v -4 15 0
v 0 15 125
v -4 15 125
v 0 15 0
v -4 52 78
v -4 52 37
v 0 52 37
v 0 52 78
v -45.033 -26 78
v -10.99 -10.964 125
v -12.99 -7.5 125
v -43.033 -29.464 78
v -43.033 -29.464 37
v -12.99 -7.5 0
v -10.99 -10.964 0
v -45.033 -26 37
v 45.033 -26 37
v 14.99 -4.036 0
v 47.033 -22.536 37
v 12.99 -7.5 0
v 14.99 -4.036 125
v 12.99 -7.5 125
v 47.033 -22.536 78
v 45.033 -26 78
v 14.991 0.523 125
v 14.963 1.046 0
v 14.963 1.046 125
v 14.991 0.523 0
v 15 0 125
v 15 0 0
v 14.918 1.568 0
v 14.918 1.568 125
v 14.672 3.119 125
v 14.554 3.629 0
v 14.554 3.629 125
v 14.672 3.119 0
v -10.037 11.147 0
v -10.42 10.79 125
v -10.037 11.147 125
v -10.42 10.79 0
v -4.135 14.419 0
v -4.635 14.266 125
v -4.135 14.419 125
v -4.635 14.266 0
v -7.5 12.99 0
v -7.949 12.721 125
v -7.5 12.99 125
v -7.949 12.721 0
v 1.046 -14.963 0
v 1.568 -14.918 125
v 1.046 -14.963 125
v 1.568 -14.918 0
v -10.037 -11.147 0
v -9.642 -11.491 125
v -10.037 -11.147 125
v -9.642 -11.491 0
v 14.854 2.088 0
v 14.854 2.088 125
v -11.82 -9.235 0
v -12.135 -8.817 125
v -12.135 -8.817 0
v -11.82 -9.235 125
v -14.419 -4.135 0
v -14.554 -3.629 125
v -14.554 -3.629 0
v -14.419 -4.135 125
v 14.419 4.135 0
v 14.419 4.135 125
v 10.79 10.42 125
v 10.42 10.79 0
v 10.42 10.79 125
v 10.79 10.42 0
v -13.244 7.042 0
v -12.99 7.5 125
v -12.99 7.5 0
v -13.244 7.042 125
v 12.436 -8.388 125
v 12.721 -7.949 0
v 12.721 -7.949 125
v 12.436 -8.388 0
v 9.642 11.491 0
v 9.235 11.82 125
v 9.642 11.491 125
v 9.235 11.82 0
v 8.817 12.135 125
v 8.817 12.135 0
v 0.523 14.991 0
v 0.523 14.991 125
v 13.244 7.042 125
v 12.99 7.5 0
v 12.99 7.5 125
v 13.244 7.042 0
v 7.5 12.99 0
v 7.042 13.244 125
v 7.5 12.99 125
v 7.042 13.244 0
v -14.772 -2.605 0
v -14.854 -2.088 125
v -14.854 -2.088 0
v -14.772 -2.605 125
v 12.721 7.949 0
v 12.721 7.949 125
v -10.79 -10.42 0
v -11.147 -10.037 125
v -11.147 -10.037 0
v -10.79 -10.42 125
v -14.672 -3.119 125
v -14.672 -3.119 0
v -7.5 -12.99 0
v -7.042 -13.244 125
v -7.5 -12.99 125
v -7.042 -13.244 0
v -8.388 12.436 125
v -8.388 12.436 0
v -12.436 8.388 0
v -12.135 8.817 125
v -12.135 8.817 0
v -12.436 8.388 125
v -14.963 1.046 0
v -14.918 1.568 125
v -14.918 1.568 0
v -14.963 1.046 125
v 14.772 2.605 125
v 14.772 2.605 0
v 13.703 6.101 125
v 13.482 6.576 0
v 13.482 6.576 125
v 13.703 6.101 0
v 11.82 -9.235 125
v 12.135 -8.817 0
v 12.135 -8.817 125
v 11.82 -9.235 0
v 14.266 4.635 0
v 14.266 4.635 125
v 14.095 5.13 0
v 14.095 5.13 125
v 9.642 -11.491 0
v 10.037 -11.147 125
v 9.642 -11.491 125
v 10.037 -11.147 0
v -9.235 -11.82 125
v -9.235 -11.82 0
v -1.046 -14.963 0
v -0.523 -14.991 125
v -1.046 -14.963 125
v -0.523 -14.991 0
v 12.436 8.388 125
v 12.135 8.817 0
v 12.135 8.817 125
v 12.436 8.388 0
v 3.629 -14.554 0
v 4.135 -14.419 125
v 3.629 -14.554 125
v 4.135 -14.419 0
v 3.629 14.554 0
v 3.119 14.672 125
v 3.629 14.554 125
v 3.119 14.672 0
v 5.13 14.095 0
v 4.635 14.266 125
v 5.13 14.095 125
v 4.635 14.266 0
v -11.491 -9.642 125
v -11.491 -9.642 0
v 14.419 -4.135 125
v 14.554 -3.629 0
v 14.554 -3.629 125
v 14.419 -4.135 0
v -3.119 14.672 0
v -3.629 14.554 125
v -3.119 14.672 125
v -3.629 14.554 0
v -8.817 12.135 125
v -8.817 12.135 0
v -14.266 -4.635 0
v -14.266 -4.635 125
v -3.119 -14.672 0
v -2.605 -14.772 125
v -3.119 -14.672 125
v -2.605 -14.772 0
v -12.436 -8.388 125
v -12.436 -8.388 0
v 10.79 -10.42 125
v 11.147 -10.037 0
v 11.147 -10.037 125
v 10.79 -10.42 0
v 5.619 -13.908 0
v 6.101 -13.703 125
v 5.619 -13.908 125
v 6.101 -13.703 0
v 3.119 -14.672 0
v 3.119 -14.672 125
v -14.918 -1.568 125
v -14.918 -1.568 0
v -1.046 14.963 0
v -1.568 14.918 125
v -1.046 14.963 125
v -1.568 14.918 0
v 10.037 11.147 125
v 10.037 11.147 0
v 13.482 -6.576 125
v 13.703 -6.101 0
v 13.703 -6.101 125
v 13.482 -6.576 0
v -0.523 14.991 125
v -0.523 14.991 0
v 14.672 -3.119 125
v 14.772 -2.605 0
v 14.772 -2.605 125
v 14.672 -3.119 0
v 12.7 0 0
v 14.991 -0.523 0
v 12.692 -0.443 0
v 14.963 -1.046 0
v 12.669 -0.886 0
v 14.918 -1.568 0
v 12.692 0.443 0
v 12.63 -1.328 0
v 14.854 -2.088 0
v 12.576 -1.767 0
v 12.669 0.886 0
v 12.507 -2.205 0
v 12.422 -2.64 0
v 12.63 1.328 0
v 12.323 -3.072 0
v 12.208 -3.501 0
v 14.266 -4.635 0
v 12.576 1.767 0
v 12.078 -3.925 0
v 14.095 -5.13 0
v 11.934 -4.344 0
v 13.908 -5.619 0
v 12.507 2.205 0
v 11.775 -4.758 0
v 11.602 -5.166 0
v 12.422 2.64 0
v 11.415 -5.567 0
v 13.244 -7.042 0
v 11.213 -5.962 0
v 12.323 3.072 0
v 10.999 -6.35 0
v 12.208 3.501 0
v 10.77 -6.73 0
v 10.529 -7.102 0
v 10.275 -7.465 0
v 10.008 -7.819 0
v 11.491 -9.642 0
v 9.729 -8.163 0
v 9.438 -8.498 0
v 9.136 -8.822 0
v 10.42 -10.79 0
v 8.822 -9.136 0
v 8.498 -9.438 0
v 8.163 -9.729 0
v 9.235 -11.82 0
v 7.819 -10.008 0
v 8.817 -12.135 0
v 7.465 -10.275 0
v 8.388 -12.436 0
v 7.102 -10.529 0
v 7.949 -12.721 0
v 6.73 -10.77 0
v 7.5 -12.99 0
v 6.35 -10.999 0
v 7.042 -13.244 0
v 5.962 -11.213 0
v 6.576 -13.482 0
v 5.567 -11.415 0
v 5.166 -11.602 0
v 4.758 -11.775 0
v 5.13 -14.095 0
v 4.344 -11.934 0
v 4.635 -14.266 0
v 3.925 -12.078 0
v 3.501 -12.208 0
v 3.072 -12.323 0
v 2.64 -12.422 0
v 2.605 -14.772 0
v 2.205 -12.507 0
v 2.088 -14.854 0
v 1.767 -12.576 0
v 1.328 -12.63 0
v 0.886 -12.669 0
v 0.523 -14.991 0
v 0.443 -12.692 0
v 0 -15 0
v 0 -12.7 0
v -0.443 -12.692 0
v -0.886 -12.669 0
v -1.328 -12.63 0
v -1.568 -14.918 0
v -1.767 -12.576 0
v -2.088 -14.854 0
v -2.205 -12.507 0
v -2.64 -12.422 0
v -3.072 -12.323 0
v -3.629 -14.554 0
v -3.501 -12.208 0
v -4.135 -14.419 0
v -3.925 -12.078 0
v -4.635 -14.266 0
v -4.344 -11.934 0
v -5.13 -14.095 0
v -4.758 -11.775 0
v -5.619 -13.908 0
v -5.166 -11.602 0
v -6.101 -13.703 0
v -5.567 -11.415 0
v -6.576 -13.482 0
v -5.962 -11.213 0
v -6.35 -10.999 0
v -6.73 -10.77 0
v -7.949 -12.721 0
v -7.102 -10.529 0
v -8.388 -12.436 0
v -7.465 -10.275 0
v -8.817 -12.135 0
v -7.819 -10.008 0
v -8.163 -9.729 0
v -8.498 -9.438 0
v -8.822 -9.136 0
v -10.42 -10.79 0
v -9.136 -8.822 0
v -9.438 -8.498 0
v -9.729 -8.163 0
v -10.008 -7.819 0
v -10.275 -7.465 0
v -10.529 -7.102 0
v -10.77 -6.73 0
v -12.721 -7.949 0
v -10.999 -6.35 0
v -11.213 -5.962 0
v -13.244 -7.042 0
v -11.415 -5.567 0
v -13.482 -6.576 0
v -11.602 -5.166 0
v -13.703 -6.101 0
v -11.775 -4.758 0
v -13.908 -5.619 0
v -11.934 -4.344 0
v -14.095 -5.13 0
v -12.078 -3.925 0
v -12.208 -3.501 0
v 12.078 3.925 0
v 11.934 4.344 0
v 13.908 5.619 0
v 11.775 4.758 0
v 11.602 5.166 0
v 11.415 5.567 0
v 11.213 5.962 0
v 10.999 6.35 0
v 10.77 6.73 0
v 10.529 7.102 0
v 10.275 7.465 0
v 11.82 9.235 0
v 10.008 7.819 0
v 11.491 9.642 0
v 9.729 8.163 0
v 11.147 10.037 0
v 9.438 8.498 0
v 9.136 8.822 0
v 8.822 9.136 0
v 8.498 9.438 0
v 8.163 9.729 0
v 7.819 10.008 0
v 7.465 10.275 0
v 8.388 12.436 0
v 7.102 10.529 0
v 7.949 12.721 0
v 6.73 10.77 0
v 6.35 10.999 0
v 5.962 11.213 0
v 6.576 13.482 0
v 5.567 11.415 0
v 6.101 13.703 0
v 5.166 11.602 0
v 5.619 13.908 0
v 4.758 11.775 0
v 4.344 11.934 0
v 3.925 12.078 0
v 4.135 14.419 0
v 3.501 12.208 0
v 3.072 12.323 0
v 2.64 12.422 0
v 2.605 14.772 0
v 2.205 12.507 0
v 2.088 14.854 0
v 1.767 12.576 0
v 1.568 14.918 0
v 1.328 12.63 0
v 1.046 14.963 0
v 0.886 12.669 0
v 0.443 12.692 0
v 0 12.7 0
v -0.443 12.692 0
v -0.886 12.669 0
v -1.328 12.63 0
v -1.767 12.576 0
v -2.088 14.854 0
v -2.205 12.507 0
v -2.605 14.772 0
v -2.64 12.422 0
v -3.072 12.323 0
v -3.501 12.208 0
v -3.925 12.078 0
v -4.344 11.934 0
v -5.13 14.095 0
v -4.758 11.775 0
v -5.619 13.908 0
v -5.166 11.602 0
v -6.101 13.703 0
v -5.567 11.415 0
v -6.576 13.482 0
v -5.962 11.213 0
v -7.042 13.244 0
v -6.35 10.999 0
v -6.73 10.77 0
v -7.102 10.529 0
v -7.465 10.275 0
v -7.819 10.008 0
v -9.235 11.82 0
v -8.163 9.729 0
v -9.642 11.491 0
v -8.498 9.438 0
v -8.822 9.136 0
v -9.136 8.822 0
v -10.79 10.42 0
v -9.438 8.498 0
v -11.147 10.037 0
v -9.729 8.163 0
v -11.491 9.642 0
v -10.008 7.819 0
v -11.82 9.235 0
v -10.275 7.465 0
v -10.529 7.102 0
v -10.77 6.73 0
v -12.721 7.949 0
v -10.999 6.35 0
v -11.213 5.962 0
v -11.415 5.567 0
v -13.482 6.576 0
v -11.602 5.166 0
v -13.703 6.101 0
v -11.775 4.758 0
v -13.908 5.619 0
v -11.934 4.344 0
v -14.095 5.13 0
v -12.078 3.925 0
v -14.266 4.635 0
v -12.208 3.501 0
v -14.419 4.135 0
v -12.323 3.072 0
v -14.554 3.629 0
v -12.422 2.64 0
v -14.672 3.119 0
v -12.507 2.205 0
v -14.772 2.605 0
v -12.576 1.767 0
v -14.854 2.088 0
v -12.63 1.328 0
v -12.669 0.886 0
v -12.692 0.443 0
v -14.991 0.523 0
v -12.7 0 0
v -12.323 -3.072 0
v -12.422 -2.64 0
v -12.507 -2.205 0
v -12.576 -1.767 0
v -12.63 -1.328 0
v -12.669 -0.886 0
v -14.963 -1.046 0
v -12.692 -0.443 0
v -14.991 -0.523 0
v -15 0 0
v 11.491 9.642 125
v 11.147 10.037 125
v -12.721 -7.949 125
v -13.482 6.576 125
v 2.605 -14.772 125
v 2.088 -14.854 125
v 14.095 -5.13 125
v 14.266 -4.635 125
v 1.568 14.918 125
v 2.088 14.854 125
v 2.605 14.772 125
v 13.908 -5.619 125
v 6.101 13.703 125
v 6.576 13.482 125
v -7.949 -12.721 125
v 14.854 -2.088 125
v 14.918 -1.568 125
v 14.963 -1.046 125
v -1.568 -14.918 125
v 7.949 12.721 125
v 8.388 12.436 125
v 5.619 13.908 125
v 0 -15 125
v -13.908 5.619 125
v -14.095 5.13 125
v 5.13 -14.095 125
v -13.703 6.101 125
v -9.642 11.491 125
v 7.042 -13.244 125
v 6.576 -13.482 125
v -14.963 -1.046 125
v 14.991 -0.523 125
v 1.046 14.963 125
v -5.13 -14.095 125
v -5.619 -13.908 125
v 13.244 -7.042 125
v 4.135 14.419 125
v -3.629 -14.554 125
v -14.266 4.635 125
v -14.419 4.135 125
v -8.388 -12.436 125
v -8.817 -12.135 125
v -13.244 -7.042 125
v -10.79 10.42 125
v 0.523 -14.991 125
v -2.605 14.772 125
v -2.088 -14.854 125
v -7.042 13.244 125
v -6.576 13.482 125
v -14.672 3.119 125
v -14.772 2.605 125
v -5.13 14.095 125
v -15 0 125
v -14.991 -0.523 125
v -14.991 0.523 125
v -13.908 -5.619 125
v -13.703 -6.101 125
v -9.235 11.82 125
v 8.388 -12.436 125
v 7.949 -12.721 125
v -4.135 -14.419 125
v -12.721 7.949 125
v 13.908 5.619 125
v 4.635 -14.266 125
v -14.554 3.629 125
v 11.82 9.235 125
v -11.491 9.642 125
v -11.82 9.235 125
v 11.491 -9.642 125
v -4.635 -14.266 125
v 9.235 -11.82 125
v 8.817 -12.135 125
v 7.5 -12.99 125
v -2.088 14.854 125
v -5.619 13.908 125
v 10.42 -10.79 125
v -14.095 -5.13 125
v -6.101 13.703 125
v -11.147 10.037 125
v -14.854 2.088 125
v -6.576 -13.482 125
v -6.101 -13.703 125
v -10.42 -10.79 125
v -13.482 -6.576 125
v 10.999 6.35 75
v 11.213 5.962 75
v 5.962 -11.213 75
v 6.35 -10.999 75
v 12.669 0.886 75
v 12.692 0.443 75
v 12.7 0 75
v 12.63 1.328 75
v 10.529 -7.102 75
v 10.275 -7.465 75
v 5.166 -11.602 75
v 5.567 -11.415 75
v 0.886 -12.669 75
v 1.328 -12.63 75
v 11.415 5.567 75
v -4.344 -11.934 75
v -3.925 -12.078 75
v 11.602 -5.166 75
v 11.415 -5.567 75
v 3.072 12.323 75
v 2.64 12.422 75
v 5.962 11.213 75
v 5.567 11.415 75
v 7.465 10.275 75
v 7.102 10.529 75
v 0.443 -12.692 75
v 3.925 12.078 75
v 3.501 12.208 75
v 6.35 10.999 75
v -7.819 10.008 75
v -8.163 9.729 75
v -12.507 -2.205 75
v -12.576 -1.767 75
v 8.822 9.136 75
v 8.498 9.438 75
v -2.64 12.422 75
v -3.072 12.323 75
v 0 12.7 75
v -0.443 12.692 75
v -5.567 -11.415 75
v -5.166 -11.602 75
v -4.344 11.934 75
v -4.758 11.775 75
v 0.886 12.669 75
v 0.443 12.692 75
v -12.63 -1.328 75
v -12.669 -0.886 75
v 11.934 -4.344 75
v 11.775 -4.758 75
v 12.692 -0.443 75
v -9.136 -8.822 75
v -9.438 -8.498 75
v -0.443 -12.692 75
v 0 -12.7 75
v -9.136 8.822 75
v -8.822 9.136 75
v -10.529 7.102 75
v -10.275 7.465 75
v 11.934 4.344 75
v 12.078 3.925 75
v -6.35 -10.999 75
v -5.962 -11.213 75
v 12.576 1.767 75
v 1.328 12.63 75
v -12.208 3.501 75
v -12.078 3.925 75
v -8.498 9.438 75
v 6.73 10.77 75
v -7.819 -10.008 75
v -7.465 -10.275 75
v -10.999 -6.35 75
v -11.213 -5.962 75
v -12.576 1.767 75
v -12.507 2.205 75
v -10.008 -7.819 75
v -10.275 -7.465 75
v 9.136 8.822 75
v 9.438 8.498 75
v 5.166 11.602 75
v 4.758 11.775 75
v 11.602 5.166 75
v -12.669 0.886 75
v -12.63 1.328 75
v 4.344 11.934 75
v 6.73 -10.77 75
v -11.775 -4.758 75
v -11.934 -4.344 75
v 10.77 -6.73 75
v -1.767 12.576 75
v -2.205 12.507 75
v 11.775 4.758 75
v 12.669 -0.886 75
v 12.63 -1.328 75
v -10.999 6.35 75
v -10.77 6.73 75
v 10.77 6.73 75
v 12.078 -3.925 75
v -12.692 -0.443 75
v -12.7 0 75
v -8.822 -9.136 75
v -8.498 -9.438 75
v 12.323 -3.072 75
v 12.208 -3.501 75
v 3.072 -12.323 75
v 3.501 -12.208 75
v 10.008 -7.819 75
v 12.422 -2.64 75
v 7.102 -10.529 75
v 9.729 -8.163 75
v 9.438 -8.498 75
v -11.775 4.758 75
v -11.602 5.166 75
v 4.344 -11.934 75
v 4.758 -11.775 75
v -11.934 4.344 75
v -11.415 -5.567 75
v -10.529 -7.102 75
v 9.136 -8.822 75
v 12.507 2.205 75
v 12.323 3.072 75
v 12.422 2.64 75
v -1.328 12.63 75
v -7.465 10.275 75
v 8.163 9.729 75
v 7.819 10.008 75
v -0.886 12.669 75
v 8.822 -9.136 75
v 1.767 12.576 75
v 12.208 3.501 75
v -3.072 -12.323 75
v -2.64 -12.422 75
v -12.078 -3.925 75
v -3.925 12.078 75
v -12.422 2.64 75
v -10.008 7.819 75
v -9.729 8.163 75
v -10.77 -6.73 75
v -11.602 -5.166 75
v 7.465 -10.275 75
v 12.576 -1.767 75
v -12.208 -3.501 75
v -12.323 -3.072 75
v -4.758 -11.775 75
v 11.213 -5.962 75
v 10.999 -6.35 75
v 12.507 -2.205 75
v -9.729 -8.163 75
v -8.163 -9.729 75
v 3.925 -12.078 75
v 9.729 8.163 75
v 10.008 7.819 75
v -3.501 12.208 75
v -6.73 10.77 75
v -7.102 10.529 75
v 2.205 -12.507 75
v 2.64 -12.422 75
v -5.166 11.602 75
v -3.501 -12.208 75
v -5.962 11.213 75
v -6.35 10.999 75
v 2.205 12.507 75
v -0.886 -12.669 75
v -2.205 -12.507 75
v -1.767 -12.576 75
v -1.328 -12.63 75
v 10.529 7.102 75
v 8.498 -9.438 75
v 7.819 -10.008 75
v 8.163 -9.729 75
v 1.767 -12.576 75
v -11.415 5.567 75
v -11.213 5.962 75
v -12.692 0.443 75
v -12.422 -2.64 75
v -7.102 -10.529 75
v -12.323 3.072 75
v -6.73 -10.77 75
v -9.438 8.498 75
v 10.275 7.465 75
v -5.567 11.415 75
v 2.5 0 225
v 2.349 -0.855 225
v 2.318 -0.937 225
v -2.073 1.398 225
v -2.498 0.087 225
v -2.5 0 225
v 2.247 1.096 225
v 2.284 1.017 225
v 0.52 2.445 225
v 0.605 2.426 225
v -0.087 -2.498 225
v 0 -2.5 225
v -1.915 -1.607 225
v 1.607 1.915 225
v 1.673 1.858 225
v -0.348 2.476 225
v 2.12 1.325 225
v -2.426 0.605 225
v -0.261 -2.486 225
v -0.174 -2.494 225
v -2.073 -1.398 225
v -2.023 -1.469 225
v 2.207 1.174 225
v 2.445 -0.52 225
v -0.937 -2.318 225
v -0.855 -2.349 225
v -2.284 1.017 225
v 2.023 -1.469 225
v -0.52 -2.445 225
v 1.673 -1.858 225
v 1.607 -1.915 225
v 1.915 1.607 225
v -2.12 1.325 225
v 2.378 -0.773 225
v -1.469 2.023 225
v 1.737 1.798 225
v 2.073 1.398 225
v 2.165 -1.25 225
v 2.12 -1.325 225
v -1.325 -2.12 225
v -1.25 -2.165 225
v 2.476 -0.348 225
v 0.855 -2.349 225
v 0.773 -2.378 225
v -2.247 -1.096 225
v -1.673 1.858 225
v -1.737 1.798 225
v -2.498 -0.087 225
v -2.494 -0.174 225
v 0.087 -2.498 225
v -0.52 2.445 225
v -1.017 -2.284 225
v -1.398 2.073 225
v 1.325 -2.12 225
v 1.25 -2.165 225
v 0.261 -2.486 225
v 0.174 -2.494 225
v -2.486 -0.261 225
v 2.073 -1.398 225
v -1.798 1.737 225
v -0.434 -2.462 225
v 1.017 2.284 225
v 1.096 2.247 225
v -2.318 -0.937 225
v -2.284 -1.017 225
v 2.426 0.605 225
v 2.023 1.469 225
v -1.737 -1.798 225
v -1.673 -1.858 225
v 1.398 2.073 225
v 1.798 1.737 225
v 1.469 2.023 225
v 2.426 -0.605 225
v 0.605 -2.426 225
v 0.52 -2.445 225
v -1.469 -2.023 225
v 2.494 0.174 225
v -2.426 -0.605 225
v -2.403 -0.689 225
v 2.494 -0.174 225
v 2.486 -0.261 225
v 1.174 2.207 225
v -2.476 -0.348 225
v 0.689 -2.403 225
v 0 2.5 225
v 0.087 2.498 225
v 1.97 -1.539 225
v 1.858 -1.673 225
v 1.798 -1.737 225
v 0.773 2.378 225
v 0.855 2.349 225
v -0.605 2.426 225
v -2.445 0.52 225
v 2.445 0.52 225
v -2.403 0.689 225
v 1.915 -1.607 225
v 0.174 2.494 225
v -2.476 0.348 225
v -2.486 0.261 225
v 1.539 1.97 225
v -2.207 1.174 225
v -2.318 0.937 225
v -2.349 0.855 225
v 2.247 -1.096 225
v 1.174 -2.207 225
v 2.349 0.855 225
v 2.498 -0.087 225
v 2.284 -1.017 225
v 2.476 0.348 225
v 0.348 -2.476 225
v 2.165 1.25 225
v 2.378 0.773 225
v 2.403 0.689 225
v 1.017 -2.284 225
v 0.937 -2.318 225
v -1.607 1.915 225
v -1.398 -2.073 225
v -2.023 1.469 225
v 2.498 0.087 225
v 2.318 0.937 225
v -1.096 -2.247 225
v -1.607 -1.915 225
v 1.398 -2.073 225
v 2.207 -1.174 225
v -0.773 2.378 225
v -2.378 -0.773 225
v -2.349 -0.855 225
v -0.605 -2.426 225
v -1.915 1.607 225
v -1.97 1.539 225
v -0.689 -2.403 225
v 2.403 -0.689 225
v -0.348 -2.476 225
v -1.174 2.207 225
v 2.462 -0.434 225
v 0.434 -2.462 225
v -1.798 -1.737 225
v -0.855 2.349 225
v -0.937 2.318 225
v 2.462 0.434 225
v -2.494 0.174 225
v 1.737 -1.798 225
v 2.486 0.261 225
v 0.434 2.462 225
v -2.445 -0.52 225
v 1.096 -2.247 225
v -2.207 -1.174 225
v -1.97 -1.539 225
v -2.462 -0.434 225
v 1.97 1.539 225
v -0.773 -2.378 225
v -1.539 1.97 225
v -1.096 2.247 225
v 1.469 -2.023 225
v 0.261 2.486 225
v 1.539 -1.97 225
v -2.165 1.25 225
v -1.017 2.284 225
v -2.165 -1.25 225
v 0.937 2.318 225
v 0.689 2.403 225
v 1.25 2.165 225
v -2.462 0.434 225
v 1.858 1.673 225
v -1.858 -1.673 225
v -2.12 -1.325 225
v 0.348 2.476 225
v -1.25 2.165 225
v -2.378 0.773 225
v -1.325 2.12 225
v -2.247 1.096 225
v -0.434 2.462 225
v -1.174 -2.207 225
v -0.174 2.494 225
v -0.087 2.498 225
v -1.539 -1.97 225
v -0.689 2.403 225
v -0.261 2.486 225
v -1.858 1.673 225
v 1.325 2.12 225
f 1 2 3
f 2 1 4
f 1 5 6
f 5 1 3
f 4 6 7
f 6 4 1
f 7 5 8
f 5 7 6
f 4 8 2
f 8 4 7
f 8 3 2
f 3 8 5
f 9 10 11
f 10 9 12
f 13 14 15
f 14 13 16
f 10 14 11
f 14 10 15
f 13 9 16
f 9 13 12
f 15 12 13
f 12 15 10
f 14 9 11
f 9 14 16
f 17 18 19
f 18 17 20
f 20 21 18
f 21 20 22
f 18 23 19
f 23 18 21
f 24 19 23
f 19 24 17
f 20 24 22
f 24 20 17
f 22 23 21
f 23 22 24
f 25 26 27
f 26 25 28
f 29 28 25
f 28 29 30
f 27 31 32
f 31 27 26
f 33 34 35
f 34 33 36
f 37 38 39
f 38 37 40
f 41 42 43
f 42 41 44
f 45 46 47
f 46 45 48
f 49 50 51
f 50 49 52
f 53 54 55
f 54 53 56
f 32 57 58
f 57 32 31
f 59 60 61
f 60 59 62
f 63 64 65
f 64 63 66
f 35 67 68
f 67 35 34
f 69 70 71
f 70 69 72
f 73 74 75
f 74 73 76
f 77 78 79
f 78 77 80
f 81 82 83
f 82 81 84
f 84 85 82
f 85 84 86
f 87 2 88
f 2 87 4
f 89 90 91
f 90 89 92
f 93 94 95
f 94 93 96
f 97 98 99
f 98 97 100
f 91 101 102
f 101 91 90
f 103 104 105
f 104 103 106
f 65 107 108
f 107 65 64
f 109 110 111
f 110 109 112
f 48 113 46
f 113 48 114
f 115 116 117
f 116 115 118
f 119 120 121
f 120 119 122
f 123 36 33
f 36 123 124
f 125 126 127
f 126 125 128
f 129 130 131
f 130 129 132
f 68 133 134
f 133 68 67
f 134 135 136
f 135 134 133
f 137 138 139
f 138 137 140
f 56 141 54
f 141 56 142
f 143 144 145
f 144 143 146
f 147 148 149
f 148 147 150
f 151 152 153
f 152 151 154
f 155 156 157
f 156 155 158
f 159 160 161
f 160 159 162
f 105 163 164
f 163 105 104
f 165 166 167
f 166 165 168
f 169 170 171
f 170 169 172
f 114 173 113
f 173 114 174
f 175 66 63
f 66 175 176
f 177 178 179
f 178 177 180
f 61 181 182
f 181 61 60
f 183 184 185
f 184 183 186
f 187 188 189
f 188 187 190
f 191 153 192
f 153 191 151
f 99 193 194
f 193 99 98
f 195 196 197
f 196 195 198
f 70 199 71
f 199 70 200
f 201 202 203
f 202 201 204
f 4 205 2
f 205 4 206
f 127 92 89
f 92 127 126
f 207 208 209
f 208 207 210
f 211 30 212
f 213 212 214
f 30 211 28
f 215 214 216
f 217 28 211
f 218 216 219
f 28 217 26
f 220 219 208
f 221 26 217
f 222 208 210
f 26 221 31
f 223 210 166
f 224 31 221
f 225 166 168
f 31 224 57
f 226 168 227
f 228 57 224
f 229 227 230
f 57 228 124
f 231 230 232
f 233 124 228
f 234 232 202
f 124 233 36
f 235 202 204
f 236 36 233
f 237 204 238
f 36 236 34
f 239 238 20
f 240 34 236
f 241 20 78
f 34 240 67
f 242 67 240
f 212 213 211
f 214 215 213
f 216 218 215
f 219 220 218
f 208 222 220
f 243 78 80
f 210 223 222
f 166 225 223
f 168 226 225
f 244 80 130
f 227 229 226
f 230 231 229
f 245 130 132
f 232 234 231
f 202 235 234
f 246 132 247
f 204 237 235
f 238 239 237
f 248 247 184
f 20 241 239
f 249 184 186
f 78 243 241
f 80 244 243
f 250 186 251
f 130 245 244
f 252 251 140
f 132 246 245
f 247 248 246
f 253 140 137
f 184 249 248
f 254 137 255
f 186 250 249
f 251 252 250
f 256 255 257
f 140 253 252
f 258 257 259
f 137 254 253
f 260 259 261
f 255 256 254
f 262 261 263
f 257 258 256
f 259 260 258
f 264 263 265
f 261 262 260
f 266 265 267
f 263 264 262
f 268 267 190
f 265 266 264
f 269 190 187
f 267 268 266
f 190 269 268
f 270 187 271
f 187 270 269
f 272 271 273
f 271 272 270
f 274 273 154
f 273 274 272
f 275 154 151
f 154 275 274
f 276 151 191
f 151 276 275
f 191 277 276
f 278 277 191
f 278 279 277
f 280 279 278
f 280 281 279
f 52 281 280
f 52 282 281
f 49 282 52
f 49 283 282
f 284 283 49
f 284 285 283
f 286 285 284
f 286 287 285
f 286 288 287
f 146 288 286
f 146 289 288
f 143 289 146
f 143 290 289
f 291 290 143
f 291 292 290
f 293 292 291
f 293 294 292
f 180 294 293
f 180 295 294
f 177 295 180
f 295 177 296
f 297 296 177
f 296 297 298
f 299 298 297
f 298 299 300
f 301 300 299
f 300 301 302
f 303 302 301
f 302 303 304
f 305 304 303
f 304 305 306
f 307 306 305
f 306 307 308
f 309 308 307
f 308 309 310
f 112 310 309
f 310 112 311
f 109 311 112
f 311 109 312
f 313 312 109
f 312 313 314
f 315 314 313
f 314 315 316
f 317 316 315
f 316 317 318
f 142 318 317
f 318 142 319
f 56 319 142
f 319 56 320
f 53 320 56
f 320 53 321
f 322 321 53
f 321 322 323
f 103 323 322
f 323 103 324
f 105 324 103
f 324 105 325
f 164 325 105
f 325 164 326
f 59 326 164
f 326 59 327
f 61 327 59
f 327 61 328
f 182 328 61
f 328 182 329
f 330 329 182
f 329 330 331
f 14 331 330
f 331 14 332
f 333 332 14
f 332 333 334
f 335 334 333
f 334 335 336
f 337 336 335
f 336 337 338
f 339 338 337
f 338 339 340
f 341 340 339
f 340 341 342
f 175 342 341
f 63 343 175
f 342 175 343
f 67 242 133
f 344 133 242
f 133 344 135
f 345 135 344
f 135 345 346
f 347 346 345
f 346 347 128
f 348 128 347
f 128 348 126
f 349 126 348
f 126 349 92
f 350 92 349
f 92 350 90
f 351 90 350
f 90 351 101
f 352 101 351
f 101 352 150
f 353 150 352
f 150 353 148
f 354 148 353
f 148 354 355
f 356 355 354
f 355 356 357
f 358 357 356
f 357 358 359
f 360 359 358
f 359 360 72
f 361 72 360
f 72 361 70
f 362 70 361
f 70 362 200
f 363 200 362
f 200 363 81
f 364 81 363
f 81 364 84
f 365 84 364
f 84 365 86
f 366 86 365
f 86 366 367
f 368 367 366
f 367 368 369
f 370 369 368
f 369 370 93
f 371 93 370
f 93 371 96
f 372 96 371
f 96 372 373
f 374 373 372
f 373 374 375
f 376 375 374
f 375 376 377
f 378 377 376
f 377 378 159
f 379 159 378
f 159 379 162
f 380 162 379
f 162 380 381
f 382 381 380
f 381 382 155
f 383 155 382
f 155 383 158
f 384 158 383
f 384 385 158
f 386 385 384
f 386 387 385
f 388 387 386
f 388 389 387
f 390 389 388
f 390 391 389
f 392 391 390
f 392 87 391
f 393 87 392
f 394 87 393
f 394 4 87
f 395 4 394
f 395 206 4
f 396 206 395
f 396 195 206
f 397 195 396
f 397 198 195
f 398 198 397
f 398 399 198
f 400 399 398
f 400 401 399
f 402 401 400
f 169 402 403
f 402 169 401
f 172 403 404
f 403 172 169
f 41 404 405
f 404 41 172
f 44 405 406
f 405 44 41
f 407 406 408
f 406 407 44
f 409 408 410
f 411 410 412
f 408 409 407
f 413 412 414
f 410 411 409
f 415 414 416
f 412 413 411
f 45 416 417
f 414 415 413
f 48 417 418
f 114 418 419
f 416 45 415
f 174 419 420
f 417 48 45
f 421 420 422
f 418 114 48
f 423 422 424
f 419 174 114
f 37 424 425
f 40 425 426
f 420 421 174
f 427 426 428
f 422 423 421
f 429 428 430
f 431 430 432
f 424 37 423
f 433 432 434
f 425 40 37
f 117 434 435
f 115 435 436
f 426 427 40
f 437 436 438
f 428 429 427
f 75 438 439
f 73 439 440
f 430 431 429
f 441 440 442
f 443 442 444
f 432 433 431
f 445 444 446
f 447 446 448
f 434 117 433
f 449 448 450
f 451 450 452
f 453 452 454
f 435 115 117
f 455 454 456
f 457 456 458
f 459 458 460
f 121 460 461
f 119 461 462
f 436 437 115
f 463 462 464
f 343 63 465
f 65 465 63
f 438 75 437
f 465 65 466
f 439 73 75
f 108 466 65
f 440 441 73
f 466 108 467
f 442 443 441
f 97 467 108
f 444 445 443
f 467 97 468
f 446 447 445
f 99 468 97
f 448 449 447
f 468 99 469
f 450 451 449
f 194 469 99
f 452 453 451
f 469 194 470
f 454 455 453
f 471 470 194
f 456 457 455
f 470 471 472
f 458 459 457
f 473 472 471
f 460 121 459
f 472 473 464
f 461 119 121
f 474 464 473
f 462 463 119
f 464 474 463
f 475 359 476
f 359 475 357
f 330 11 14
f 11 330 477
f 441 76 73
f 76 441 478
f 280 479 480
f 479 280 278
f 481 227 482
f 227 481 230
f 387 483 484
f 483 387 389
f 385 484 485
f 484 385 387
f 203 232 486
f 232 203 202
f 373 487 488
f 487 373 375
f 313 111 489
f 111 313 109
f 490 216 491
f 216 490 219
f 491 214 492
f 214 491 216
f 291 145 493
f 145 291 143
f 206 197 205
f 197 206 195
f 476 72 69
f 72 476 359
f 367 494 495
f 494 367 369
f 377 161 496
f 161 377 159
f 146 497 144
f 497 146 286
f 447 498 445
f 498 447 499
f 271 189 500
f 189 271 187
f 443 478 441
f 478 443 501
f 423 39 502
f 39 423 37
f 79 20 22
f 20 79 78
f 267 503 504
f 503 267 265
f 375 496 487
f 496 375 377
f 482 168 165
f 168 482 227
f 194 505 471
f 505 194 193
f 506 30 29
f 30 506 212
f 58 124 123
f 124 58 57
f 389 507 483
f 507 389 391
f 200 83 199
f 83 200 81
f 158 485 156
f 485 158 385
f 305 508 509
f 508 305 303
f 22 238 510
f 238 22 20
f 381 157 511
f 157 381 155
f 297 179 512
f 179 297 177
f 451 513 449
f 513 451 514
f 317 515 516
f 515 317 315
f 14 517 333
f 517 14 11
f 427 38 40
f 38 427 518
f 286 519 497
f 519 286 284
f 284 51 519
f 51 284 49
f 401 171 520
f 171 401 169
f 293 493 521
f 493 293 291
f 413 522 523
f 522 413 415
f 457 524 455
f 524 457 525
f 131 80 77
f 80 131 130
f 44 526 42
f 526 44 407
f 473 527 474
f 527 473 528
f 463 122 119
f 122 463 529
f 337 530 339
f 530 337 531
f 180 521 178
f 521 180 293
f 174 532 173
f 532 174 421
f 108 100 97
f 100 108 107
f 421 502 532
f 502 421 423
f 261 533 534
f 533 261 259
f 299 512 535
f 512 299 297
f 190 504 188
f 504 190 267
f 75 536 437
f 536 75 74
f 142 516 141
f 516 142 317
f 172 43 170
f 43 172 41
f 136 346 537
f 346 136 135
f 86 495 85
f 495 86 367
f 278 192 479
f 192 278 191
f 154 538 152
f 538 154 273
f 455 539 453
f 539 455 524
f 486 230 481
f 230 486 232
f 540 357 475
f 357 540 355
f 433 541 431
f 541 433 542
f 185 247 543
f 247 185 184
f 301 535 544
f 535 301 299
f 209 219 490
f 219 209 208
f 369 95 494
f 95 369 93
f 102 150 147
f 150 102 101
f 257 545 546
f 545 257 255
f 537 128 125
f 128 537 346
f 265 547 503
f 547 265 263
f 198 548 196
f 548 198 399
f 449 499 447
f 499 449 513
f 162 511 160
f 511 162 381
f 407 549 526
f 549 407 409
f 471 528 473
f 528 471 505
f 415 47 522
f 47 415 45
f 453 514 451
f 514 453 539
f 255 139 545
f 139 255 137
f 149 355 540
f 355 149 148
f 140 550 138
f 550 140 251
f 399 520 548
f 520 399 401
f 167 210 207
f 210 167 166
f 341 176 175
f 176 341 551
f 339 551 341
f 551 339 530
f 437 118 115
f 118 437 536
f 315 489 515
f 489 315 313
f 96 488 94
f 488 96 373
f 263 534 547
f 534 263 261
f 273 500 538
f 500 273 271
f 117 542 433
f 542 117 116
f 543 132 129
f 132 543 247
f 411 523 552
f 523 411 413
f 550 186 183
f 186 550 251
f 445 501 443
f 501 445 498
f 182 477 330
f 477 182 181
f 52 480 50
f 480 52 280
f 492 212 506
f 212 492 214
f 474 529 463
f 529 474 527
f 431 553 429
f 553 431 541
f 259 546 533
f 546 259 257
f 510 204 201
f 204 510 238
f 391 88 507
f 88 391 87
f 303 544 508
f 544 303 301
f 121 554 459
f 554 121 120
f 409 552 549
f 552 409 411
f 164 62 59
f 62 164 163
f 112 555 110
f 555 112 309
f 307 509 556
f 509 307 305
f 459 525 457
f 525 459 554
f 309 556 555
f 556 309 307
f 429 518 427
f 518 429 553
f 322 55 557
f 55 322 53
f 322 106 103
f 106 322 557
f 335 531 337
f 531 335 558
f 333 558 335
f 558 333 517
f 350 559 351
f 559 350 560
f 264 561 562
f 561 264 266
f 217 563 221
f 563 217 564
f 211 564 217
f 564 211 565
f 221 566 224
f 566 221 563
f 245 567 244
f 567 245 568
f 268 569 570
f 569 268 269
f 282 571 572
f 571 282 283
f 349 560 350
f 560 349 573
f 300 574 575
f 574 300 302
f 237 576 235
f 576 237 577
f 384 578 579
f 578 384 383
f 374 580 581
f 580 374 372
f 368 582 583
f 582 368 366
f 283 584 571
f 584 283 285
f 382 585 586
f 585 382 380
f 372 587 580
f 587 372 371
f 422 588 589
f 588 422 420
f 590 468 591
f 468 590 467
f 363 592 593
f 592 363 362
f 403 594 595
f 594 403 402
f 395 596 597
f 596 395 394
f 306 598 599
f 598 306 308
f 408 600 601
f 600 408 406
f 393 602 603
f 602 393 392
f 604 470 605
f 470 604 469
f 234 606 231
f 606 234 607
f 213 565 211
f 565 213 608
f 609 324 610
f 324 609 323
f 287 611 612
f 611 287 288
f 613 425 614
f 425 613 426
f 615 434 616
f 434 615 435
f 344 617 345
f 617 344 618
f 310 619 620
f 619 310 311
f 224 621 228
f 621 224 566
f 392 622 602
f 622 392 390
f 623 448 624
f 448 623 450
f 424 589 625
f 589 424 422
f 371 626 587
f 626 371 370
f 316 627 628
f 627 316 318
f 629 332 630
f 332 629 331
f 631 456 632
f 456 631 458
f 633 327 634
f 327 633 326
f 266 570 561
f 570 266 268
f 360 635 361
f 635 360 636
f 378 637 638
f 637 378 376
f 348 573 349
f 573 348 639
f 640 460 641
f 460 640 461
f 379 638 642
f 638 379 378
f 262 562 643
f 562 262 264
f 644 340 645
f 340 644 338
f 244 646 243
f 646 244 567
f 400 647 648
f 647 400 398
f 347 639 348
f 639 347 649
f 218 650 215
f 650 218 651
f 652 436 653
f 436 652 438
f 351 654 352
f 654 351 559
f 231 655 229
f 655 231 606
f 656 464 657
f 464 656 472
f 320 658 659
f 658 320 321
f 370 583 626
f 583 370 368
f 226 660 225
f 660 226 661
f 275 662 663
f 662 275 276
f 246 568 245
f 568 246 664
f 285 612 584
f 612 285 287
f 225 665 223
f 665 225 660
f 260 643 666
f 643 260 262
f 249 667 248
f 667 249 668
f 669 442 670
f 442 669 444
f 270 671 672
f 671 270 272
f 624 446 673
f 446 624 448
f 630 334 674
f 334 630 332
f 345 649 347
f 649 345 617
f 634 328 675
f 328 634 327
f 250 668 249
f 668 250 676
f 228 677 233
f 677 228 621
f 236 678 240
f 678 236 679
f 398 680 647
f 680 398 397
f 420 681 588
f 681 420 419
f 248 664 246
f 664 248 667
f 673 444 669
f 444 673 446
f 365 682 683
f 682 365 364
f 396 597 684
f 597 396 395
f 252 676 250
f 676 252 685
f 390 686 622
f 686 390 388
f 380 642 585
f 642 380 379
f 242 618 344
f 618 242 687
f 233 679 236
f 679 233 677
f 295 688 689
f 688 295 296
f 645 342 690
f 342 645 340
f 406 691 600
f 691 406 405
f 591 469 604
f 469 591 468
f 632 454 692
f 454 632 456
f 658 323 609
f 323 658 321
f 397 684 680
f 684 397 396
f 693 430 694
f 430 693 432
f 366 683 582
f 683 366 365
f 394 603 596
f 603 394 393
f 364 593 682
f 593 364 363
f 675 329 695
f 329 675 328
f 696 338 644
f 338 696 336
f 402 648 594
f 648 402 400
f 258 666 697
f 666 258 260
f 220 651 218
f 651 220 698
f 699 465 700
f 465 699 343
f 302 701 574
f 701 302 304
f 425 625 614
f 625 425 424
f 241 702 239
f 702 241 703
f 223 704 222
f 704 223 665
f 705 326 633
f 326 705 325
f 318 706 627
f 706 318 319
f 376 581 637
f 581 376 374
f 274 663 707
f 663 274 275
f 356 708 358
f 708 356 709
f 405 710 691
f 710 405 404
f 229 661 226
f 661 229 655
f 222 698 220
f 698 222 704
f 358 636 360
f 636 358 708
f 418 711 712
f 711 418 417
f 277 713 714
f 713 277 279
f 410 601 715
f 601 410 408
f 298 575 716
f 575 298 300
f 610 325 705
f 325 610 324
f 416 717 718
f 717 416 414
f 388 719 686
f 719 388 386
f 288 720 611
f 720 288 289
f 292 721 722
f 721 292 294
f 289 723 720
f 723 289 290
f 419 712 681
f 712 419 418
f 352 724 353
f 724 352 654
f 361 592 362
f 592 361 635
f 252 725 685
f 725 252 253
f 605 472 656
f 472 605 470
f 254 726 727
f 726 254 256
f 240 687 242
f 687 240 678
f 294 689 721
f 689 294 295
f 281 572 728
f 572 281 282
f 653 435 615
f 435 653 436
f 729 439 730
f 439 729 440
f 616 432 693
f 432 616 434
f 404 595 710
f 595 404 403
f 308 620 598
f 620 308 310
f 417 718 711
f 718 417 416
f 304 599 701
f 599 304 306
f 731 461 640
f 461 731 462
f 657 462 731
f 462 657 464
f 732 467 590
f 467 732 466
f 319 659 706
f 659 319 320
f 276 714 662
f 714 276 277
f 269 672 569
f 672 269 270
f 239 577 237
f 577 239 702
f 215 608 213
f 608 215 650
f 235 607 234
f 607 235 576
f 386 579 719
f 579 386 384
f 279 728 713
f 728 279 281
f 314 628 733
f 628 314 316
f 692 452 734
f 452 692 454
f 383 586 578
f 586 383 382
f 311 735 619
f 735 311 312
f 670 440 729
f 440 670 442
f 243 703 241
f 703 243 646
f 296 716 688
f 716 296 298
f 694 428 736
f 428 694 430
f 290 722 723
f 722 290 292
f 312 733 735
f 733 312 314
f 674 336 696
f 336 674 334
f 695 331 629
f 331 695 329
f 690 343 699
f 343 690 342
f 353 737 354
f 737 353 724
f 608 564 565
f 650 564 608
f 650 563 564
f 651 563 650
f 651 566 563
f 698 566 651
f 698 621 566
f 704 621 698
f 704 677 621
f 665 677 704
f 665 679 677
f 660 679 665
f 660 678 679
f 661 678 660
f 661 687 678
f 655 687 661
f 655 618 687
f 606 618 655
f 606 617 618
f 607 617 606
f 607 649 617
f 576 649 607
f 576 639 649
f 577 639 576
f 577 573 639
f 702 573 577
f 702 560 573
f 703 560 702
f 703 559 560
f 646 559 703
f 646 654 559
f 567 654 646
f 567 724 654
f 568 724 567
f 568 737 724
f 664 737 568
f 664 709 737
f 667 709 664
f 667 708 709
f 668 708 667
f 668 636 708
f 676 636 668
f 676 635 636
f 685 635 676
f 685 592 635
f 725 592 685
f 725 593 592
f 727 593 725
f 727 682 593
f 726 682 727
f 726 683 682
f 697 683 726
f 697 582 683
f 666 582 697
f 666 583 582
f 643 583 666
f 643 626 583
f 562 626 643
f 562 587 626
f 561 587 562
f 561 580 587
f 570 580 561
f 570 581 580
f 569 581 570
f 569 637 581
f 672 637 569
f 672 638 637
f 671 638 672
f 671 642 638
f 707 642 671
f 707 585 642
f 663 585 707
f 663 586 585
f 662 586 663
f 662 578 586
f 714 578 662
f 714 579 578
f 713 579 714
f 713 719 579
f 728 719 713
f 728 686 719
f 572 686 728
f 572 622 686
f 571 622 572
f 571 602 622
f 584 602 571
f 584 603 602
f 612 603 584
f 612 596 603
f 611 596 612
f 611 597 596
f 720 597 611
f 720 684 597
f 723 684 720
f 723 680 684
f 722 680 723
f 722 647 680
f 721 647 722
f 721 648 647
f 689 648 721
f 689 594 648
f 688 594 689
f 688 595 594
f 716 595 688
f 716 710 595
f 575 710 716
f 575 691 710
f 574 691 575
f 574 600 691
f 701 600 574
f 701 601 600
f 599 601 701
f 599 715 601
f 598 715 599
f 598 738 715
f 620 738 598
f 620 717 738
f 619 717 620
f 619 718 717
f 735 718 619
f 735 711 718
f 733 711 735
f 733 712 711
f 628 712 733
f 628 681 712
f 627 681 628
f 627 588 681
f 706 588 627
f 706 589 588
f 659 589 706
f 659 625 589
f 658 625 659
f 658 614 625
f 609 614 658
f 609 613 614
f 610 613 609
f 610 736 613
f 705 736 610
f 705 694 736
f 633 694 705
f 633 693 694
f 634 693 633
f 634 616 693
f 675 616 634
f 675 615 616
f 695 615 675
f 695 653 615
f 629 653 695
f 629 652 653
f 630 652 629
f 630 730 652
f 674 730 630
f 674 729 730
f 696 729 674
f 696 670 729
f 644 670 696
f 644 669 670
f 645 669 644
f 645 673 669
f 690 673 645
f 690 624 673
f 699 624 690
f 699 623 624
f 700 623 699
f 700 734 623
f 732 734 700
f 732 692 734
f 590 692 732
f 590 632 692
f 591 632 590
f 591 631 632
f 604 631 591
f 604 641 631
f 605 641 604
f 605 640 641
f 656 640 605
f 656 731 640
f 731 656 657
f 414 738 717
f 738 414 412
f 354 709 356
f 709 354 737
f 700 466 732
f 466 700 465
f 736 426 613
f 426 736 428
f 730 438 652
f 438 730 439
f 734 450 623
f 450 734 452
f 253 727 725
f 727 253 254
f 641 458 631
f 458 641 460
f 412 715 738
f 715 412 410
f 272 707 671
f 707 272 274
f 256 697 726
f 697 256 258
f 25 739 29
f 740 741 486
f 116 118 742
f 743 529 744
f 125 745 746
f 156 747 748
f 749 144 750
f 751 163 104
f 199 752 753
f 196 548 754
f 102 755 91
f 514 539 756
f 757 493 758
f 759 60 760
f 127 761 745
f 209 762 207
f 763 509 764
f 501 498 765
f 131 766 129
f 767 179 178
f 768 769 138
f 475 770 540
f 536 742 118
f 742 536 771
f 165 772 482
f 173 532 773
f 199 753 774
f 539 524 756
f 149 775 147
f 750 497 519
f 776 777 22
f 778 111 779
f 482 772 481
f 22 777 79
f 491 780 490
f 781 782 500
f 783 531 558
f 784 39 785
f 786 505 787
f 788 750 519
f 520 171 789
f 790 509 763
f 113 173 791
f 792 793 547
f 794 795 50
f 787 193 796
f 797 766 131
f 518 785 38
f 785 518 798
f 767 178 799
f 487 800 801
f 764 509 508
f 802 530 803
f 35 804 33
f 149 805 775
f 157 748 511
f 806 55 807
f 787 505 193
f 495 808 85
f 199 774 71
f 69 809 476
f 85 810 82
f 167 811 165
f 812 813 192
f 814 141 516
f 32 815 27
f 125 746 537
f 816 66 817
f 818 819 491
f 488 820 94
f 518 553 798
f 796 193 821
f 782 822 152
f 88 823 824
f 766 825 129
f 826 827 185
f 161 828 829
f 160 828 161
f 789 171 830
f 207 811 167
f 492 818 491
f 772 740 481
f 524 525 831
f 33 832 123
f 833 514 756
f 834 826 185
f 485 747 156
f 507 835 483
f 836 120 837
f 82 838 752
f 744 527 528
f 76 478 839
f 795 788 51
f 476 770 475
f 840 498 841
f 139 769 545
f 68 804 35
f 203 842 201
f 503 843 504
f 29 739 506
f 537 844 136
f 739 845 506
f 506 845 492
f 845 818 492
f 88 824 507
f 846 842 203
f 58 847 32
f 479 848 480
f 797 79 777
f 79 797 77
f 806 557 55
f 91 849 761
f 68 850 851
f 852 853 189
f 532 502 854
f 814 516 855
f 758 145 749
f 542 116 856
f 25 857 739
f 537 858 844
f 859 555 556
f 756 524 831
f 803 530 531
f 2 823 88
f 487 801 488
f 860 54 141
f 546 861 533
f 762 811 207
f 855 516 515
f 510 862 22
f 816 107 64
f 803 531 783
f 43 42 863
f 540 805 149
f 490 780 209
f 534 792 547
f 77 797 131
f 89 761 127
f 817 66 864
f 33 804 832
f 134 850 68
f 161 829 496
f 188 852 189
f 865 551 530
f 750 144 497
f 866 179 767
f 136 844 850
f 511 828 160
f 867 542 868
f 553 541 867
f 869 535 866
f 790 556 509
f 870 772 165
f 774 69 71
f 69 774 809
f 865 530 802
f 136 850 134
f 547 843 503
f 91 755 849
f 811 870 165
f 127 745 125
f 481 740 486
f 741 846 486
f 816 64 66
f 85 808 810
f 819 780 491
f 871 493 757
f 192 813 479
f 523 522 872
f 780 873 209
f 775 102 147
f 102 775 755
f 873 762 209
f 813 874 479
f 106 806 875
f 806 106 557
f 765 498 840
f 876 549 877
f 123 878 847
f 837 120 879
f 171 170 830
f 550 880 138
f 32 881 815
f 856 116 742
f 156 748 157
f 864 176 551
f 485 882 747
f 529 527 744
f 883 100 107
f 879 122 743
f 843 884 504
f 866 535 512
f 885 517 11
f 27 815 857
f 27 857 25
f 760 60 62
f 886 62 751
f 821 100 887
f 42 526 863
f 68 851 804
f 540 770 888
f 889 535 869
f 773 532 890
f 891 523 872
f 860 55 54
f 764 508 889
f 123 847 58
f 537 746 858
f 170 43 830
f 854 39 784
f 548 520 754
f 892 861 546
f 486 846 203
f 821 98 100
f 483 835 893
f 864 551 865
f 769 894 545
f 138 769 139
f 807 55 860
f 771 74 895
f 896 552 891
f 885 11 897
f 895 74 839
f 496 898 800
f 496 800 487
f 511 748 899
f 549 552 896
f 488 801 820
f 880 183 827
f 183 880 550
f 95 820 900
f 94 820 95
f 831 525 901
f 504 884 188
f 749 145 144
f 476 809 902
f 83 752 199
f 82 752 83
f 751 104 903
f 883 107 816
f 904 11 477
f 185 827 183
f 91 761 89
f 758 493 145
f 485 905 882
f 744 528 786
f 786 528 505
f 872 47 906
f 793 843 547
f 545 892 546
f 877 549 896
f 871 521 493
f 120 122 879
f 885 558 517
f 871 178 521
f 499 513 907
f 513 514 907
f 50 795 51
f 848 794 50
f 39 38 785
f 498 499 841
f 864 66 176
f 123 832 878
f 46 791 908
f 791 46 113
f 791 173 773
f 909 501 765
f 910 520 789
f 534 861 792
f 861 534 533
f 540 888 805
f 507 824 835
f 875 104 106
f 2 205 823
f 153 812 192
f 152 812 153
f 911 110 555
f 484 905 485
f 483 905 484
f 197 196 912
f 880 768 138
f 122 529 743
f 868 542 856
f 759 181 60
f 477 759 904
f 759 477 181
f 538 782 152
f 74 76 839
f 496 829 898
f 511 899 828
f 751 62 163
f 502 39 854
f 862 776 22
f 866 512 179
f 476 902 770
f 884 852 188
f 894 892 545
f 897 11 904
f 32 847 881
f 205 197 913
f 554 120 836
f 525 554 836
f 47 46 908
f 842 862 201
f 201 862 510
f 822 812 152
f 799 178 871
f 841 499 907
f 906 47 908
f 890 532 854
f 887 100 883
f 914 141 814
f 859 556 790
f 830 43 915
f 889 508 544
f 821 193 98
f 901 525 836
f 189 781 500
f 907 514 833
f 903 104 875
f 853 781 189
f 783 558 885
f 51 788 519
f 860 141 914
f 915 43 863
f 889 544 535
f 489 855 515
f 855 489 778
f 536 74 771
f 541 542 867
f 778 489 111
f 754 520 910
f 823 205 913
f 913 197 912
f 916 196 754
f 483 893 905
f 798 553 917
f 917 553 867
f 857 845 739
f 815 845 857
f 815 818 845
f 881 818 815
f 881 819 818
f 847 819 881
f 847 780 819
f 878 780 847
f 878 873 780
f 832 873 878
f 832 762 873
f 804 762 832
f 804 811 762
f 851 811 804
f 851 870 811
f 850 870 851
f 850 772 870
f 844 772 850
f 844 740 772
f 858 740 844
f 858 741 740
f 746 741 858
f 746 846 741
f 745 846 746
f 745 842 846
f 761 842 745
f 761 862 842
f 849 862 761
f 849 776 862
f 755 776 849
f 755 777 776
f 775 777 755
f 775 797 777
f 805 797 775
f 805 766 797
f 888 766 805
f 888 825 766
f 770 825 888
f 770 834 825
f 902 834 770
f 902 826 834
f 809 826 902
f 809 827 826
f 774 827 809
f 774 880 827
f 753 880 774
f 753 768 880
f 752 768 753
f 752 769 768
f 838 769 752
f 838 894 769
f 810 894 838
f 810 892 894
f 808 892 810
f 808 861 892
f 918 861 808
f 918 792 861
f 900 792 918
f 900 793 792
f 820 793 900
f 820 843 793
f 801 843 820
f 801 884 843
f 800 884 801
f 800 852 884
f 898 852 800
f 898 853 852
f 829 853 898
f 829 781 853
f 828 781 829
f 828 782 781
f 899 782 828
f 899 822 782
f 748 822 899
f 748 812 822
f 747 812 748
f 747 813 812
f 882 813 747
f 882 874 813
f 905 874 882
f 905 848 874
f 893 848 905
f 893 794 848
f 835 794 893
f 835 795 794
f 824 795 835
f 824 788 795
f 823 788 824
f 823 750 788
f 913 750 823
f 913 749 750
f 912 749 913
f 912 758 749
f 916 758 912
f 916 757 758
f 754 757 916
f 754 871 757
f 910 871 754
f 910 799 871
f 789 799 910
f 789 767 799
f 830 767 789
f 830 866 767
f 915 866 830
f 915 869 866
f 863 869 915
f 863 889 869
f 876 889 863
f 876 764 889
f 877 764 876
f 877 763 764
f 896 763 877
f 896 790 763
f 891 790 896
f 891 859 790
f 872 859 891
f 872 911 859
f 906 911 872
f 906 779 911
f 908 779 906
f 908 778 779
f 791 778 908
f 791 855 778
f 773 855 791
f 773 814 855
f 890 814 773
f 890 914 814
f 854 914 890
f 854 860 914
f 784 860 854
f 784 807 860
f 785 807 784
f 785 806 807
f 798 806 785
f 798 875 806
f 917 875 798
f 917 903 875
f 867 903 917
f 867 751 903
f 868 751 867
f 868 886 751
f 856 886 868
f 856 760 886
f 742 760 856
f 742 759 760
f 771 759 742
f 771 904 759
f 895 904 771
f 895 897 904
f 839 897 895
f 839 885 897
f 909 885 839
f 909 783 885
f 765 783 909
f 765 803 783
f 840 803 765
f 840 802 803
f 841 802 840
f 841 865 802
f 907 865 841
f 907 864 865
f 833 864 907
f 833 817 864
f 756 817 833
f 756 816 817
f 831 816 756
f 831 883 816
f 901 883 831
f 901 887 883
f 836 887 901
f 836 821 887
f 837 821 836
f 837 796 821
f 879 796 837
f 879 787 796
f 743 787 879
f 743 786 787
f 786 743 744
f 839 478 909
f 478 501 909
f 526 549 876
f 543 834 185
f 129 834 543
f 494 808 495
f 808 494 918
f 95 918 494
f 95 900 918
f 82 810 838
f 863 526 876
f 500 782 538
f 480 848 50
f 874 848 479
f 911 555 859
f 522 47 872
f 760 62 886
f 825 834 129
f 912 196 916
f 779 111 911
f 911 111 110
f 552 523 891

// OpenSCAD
//gaffi stick base replica
//all in mm because.


rough_preview_fns = 80;
render_fns = 180;

$fn = $preview ? rough_preview_fns : render_fns;


staff_actual_diameter = 25.4;
staff_start_diameter = 30;
staff_transition_ring_height = 6;
staff_inset_height = 75;

base_spike_fin_height = 125;
base_spike_fin_width = 37;
base_spike_fin_depth = 4;
base_spike_taper_angles = 45;
base_spike_length_after_fins = 100;

for (i = [0:120:240]){
    rotate([0,0,i]){
        translate([0,staff_start_diameter/2,0]){
            rotate([0,-90,0]){
                linear_extrude(base_spike_fin_depth) {
                    polygon([[0,0],[base_spike_fin_height,0],[base_spike_fin_height-base_spike_fin_width-10,base_spike_fin_width],[base_spike_fin_width,base_spike_fin_width]]);
                }
            }
        }
    }
}

//cylinder(staff_inset_height,staff_actual_diameter/2,staff_actual_diameter/2);



difference(){

cylinder(base_spike_fin_height,staff_start_diameter/2,staff_start_diameter/2);

cylinder(staff_inset_height,staff_actual_diameter/2,staff_actual_diameter/2);
}//end difference


translate([0,0,base_spike_fin_height]){
    cylinder(base_spike_length_after_fins,staff_start_diameter/2,2.5);
}

//polyhedron([[0,0,0],[base_spike_fin_height,0,0],[base_spike_fin_height-base_spike_fin_width-10,base_spike_fin_width,0],[base_spike_fin_width,base_spike_fin_width,0],[[0,0,base_spike_fin_depth],[base_spike_fin_height,0,base_spike_fin_depth],[base_spike_fin_height-base_spike_fin_width-10,base_spike_fin_width,base_spike_fin_depth],[base_spike_fin_width,base_spike_fin_width,base_spike_fin_depth]]);
